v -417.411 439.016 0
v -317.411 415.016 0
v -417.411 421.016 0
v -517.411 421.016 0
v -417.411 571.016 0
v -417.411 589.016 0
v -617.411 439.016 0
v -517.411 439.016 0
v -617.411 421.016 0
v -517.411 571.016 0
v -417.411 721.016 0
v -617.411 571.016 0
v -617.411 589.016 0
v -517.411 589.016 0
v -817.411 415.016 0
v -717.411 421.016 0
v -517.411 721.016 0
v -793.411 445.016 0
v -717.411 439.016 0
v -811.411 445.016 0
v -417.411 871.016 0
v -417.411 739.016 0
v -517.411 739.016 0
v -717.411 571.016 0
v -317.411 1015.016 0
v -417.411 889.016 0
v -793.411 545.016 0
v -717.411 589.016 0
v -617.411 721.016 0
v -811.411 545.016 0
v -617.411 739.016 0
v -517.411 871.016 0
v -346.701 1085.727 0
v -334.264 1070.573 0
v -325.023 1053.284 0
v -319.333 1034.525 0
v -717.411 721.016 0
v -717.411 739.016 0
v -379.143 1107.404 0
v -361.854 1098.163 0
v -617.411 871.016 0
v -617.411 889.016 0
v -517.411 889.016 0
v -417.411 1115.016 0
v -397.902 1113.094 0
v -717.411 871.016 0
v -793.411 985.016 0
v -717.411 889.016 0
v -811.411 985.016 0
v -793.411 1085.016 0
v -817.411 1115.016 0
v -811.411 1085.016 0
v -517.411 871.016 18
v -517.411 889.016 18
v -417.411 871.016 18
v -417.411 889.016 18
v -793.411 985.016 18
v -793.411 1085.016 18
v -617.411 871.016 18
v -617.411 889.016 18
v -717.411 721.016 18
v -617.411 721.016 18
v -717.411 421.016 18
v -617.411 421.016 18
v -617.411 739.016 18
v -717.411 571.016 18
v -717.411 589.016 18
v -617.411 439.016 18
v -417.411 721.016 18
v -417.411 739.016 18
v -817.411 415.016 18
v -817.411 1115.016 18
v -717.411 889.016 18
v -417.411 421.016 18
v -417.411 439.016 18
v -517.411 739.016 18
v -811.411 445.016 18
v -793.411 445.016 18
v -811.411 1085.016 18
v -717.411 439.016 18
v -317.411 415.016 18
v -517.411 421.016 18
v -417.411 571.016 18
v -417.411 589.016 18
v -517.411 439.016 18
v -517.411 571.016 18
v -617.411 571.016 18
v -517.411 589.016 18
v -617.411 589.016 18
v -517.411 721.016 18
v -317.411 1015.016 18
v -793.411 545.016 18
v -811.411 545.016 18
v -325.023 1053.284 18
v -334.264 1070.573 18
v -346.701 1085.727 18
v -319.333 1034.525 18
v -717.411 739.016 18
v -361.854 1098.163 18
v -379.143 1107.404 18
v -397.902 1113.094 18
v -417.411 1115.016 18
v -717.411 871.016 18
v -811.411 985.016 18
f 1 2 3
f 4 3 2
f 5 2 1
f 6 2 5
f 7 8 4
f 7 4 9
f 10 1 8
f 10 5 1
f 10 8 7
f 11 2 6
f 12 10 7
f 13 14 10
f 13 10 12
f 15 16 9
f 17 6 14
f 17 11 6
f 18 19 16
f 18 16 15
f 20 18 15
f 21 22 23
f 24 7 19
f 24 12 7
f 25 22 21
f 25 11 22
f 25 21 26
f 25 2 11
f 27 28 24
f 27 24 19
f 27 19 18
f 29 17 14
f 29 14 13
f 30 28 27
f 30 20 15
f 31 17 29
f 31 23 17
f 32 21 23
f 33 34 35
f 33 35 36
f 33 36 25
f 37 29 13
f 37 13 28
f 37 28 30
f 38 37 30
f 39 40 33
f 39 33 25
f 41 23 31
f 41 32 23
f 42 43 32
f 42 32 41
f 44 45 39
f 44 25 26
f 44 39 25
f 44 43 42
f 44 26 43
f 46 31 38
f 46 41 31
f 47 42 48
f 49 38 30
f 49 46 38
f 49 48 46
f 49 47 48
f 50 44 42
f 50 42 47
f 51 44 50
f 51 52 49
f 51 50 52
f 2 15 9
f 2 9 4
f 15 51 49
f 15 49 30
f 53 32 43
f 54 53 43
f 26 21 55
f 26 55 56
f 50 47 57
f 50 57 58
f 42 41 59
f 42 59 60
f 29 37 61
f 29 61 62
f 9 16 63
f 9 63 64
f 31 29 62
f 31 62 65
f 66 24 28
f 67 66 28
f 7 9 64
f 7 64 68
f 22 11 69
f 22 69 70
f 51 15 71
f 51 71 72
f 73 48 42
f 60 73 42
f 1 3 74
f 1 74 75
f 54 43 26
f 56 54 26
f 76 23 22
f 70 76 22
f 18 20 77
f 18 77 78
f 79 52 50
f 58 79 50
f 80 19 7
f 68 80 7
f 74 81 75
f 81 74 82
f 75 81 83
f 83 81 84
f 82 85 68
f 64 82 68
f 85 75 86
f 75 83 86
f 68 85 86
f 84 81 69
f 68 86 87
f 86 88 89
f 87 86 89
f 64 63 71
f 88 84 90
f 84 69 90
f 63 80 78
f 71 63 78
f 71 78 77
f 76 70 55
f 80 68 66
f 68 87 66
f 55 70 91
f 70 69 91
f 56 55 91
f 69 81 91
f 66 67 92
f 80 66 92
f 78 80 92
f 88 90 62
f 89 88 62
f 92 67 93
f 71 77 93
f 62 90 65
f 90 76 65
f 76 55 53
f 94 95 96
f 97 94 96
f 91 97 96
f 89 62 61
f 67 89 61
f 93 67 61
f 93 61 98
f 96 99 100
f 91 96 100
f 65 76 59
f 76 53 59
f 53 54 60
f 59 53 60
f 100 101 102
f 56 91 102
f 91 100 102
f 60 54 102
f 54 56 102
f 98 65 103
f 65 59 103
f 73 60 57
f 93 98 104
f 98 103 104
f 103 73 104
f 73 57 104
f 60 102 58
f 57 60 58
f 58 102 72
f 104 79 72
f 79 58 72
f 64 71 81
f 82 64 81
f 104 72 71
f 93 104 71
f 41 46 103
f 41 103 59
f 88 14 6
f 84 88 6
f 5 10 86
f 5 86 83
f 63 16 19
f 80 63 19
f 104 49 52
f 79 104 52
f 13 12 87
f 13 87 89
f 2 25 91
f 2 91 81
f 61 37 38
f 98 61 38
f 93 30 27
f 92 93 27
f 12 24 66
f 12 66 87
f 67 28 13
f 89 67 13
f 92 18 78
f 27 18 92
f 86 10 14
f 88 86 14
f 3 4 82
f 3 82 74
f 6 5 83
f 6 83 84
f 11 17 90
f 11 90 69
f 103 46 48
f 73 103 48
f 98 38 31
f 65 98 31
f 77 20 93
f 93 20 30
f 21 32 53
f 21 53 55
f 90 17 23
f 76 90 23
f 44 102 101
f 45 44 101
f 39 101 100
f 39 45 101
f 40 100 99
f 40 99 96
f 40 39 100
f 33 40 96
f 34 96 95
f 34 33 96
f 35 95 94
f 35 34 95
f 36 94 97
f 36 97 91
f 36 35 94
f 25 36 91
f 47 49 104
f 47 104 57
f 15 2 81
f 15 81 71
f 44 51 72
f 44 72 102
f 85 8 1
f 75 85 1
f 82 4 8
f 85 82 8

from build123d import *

# Parameters (mm, degrees)
SKETCH1_W           = 100
SKETCH1_H           = 18
SKETCH1_W_2         = 18
SKETCH1_H_2         = 100
BOSS_EXTRUDE1_DEPTH = 18


with BuildPart() as part:
    # Sketch1 → Boss-Extrude1 (new body)
    with BuildSketch(Plane.XY):
        with BuildLine():
            Line((-817.41132124, 1115.015948799), (-417.41132124, 1115.015948799))
            ThreePointArc((-417.41132124, 1115.015948799), (-346.700643121, 1085.726626917), (-317.41132124, 1015.015948799))
            Line((-317.41132124, 1015.015948799), (-317.41132124, 415.015948799))
            Line((-317.41132124, 415.015948799), (-817.41132124, 415.015948799))
            Line((-817.41132124, 415.015948799), (-817.41132124, 1115.015948799))
        make_face()
        with Locations((-667.41132124, 430.015948799)):
            Rectangle(SKETCH1_W, SKETCH1_H, mode=Mode.SUBTRACT)
        with Locations((-467.41132124, 580.015948799)):
            Rectangle(SKETCH1_W, SKETCH1_H, mode=Mode.SUBTRACT)
        with Locations((-467.41132124, 430.015948799)):
            Rectangle(SKETCH1_W, SKETCH1_H, mode=Mode.SUBTRACT)
        with Locations((-667.41132124, 580.015948799)):
            Rectangle(SKETCH1_W, SKETCH1_H, mode=Mode.SUBTRACT)
        with Locations((-467.41132124, 730.015948799)):
            Rectangle(SKETCH1_W, SKETCH1_H, mode=Mode.SUBTRACT)
        with Locations((-667.41132124, 730.015948799)):
            Rectangle(SKETCH1_W, SKETCH1_H, mode=Mode.SUBTRACT)
        with Locations((-467.41132124, 880.015948799)):
            Rectangle(SKETCH1_W, SKETCH1_H, mode=Mode.SUBTRACT)
        with Locations((-667.41132124, 880.015948799)):
            Rectangle(SKETCH1_W, SKETCH1_H, mode=Mode.SUBTRACT)
        with Locations((-802.41132124, 495.015948799)):
            Rectangle(SKETCH1_W_2, SKETCH1_H_2, mode=Mode.SUBTRACT)
        with Locations((-802.41132124, 1035.015948799)):
            Rectangle(SKETCH1_W_2, SKETCH1_H_2, mode=Mode.SUBTRACT)
    extrude(amount=BOSS_EXTRUDE1_DEPTH)


solid = part.part
